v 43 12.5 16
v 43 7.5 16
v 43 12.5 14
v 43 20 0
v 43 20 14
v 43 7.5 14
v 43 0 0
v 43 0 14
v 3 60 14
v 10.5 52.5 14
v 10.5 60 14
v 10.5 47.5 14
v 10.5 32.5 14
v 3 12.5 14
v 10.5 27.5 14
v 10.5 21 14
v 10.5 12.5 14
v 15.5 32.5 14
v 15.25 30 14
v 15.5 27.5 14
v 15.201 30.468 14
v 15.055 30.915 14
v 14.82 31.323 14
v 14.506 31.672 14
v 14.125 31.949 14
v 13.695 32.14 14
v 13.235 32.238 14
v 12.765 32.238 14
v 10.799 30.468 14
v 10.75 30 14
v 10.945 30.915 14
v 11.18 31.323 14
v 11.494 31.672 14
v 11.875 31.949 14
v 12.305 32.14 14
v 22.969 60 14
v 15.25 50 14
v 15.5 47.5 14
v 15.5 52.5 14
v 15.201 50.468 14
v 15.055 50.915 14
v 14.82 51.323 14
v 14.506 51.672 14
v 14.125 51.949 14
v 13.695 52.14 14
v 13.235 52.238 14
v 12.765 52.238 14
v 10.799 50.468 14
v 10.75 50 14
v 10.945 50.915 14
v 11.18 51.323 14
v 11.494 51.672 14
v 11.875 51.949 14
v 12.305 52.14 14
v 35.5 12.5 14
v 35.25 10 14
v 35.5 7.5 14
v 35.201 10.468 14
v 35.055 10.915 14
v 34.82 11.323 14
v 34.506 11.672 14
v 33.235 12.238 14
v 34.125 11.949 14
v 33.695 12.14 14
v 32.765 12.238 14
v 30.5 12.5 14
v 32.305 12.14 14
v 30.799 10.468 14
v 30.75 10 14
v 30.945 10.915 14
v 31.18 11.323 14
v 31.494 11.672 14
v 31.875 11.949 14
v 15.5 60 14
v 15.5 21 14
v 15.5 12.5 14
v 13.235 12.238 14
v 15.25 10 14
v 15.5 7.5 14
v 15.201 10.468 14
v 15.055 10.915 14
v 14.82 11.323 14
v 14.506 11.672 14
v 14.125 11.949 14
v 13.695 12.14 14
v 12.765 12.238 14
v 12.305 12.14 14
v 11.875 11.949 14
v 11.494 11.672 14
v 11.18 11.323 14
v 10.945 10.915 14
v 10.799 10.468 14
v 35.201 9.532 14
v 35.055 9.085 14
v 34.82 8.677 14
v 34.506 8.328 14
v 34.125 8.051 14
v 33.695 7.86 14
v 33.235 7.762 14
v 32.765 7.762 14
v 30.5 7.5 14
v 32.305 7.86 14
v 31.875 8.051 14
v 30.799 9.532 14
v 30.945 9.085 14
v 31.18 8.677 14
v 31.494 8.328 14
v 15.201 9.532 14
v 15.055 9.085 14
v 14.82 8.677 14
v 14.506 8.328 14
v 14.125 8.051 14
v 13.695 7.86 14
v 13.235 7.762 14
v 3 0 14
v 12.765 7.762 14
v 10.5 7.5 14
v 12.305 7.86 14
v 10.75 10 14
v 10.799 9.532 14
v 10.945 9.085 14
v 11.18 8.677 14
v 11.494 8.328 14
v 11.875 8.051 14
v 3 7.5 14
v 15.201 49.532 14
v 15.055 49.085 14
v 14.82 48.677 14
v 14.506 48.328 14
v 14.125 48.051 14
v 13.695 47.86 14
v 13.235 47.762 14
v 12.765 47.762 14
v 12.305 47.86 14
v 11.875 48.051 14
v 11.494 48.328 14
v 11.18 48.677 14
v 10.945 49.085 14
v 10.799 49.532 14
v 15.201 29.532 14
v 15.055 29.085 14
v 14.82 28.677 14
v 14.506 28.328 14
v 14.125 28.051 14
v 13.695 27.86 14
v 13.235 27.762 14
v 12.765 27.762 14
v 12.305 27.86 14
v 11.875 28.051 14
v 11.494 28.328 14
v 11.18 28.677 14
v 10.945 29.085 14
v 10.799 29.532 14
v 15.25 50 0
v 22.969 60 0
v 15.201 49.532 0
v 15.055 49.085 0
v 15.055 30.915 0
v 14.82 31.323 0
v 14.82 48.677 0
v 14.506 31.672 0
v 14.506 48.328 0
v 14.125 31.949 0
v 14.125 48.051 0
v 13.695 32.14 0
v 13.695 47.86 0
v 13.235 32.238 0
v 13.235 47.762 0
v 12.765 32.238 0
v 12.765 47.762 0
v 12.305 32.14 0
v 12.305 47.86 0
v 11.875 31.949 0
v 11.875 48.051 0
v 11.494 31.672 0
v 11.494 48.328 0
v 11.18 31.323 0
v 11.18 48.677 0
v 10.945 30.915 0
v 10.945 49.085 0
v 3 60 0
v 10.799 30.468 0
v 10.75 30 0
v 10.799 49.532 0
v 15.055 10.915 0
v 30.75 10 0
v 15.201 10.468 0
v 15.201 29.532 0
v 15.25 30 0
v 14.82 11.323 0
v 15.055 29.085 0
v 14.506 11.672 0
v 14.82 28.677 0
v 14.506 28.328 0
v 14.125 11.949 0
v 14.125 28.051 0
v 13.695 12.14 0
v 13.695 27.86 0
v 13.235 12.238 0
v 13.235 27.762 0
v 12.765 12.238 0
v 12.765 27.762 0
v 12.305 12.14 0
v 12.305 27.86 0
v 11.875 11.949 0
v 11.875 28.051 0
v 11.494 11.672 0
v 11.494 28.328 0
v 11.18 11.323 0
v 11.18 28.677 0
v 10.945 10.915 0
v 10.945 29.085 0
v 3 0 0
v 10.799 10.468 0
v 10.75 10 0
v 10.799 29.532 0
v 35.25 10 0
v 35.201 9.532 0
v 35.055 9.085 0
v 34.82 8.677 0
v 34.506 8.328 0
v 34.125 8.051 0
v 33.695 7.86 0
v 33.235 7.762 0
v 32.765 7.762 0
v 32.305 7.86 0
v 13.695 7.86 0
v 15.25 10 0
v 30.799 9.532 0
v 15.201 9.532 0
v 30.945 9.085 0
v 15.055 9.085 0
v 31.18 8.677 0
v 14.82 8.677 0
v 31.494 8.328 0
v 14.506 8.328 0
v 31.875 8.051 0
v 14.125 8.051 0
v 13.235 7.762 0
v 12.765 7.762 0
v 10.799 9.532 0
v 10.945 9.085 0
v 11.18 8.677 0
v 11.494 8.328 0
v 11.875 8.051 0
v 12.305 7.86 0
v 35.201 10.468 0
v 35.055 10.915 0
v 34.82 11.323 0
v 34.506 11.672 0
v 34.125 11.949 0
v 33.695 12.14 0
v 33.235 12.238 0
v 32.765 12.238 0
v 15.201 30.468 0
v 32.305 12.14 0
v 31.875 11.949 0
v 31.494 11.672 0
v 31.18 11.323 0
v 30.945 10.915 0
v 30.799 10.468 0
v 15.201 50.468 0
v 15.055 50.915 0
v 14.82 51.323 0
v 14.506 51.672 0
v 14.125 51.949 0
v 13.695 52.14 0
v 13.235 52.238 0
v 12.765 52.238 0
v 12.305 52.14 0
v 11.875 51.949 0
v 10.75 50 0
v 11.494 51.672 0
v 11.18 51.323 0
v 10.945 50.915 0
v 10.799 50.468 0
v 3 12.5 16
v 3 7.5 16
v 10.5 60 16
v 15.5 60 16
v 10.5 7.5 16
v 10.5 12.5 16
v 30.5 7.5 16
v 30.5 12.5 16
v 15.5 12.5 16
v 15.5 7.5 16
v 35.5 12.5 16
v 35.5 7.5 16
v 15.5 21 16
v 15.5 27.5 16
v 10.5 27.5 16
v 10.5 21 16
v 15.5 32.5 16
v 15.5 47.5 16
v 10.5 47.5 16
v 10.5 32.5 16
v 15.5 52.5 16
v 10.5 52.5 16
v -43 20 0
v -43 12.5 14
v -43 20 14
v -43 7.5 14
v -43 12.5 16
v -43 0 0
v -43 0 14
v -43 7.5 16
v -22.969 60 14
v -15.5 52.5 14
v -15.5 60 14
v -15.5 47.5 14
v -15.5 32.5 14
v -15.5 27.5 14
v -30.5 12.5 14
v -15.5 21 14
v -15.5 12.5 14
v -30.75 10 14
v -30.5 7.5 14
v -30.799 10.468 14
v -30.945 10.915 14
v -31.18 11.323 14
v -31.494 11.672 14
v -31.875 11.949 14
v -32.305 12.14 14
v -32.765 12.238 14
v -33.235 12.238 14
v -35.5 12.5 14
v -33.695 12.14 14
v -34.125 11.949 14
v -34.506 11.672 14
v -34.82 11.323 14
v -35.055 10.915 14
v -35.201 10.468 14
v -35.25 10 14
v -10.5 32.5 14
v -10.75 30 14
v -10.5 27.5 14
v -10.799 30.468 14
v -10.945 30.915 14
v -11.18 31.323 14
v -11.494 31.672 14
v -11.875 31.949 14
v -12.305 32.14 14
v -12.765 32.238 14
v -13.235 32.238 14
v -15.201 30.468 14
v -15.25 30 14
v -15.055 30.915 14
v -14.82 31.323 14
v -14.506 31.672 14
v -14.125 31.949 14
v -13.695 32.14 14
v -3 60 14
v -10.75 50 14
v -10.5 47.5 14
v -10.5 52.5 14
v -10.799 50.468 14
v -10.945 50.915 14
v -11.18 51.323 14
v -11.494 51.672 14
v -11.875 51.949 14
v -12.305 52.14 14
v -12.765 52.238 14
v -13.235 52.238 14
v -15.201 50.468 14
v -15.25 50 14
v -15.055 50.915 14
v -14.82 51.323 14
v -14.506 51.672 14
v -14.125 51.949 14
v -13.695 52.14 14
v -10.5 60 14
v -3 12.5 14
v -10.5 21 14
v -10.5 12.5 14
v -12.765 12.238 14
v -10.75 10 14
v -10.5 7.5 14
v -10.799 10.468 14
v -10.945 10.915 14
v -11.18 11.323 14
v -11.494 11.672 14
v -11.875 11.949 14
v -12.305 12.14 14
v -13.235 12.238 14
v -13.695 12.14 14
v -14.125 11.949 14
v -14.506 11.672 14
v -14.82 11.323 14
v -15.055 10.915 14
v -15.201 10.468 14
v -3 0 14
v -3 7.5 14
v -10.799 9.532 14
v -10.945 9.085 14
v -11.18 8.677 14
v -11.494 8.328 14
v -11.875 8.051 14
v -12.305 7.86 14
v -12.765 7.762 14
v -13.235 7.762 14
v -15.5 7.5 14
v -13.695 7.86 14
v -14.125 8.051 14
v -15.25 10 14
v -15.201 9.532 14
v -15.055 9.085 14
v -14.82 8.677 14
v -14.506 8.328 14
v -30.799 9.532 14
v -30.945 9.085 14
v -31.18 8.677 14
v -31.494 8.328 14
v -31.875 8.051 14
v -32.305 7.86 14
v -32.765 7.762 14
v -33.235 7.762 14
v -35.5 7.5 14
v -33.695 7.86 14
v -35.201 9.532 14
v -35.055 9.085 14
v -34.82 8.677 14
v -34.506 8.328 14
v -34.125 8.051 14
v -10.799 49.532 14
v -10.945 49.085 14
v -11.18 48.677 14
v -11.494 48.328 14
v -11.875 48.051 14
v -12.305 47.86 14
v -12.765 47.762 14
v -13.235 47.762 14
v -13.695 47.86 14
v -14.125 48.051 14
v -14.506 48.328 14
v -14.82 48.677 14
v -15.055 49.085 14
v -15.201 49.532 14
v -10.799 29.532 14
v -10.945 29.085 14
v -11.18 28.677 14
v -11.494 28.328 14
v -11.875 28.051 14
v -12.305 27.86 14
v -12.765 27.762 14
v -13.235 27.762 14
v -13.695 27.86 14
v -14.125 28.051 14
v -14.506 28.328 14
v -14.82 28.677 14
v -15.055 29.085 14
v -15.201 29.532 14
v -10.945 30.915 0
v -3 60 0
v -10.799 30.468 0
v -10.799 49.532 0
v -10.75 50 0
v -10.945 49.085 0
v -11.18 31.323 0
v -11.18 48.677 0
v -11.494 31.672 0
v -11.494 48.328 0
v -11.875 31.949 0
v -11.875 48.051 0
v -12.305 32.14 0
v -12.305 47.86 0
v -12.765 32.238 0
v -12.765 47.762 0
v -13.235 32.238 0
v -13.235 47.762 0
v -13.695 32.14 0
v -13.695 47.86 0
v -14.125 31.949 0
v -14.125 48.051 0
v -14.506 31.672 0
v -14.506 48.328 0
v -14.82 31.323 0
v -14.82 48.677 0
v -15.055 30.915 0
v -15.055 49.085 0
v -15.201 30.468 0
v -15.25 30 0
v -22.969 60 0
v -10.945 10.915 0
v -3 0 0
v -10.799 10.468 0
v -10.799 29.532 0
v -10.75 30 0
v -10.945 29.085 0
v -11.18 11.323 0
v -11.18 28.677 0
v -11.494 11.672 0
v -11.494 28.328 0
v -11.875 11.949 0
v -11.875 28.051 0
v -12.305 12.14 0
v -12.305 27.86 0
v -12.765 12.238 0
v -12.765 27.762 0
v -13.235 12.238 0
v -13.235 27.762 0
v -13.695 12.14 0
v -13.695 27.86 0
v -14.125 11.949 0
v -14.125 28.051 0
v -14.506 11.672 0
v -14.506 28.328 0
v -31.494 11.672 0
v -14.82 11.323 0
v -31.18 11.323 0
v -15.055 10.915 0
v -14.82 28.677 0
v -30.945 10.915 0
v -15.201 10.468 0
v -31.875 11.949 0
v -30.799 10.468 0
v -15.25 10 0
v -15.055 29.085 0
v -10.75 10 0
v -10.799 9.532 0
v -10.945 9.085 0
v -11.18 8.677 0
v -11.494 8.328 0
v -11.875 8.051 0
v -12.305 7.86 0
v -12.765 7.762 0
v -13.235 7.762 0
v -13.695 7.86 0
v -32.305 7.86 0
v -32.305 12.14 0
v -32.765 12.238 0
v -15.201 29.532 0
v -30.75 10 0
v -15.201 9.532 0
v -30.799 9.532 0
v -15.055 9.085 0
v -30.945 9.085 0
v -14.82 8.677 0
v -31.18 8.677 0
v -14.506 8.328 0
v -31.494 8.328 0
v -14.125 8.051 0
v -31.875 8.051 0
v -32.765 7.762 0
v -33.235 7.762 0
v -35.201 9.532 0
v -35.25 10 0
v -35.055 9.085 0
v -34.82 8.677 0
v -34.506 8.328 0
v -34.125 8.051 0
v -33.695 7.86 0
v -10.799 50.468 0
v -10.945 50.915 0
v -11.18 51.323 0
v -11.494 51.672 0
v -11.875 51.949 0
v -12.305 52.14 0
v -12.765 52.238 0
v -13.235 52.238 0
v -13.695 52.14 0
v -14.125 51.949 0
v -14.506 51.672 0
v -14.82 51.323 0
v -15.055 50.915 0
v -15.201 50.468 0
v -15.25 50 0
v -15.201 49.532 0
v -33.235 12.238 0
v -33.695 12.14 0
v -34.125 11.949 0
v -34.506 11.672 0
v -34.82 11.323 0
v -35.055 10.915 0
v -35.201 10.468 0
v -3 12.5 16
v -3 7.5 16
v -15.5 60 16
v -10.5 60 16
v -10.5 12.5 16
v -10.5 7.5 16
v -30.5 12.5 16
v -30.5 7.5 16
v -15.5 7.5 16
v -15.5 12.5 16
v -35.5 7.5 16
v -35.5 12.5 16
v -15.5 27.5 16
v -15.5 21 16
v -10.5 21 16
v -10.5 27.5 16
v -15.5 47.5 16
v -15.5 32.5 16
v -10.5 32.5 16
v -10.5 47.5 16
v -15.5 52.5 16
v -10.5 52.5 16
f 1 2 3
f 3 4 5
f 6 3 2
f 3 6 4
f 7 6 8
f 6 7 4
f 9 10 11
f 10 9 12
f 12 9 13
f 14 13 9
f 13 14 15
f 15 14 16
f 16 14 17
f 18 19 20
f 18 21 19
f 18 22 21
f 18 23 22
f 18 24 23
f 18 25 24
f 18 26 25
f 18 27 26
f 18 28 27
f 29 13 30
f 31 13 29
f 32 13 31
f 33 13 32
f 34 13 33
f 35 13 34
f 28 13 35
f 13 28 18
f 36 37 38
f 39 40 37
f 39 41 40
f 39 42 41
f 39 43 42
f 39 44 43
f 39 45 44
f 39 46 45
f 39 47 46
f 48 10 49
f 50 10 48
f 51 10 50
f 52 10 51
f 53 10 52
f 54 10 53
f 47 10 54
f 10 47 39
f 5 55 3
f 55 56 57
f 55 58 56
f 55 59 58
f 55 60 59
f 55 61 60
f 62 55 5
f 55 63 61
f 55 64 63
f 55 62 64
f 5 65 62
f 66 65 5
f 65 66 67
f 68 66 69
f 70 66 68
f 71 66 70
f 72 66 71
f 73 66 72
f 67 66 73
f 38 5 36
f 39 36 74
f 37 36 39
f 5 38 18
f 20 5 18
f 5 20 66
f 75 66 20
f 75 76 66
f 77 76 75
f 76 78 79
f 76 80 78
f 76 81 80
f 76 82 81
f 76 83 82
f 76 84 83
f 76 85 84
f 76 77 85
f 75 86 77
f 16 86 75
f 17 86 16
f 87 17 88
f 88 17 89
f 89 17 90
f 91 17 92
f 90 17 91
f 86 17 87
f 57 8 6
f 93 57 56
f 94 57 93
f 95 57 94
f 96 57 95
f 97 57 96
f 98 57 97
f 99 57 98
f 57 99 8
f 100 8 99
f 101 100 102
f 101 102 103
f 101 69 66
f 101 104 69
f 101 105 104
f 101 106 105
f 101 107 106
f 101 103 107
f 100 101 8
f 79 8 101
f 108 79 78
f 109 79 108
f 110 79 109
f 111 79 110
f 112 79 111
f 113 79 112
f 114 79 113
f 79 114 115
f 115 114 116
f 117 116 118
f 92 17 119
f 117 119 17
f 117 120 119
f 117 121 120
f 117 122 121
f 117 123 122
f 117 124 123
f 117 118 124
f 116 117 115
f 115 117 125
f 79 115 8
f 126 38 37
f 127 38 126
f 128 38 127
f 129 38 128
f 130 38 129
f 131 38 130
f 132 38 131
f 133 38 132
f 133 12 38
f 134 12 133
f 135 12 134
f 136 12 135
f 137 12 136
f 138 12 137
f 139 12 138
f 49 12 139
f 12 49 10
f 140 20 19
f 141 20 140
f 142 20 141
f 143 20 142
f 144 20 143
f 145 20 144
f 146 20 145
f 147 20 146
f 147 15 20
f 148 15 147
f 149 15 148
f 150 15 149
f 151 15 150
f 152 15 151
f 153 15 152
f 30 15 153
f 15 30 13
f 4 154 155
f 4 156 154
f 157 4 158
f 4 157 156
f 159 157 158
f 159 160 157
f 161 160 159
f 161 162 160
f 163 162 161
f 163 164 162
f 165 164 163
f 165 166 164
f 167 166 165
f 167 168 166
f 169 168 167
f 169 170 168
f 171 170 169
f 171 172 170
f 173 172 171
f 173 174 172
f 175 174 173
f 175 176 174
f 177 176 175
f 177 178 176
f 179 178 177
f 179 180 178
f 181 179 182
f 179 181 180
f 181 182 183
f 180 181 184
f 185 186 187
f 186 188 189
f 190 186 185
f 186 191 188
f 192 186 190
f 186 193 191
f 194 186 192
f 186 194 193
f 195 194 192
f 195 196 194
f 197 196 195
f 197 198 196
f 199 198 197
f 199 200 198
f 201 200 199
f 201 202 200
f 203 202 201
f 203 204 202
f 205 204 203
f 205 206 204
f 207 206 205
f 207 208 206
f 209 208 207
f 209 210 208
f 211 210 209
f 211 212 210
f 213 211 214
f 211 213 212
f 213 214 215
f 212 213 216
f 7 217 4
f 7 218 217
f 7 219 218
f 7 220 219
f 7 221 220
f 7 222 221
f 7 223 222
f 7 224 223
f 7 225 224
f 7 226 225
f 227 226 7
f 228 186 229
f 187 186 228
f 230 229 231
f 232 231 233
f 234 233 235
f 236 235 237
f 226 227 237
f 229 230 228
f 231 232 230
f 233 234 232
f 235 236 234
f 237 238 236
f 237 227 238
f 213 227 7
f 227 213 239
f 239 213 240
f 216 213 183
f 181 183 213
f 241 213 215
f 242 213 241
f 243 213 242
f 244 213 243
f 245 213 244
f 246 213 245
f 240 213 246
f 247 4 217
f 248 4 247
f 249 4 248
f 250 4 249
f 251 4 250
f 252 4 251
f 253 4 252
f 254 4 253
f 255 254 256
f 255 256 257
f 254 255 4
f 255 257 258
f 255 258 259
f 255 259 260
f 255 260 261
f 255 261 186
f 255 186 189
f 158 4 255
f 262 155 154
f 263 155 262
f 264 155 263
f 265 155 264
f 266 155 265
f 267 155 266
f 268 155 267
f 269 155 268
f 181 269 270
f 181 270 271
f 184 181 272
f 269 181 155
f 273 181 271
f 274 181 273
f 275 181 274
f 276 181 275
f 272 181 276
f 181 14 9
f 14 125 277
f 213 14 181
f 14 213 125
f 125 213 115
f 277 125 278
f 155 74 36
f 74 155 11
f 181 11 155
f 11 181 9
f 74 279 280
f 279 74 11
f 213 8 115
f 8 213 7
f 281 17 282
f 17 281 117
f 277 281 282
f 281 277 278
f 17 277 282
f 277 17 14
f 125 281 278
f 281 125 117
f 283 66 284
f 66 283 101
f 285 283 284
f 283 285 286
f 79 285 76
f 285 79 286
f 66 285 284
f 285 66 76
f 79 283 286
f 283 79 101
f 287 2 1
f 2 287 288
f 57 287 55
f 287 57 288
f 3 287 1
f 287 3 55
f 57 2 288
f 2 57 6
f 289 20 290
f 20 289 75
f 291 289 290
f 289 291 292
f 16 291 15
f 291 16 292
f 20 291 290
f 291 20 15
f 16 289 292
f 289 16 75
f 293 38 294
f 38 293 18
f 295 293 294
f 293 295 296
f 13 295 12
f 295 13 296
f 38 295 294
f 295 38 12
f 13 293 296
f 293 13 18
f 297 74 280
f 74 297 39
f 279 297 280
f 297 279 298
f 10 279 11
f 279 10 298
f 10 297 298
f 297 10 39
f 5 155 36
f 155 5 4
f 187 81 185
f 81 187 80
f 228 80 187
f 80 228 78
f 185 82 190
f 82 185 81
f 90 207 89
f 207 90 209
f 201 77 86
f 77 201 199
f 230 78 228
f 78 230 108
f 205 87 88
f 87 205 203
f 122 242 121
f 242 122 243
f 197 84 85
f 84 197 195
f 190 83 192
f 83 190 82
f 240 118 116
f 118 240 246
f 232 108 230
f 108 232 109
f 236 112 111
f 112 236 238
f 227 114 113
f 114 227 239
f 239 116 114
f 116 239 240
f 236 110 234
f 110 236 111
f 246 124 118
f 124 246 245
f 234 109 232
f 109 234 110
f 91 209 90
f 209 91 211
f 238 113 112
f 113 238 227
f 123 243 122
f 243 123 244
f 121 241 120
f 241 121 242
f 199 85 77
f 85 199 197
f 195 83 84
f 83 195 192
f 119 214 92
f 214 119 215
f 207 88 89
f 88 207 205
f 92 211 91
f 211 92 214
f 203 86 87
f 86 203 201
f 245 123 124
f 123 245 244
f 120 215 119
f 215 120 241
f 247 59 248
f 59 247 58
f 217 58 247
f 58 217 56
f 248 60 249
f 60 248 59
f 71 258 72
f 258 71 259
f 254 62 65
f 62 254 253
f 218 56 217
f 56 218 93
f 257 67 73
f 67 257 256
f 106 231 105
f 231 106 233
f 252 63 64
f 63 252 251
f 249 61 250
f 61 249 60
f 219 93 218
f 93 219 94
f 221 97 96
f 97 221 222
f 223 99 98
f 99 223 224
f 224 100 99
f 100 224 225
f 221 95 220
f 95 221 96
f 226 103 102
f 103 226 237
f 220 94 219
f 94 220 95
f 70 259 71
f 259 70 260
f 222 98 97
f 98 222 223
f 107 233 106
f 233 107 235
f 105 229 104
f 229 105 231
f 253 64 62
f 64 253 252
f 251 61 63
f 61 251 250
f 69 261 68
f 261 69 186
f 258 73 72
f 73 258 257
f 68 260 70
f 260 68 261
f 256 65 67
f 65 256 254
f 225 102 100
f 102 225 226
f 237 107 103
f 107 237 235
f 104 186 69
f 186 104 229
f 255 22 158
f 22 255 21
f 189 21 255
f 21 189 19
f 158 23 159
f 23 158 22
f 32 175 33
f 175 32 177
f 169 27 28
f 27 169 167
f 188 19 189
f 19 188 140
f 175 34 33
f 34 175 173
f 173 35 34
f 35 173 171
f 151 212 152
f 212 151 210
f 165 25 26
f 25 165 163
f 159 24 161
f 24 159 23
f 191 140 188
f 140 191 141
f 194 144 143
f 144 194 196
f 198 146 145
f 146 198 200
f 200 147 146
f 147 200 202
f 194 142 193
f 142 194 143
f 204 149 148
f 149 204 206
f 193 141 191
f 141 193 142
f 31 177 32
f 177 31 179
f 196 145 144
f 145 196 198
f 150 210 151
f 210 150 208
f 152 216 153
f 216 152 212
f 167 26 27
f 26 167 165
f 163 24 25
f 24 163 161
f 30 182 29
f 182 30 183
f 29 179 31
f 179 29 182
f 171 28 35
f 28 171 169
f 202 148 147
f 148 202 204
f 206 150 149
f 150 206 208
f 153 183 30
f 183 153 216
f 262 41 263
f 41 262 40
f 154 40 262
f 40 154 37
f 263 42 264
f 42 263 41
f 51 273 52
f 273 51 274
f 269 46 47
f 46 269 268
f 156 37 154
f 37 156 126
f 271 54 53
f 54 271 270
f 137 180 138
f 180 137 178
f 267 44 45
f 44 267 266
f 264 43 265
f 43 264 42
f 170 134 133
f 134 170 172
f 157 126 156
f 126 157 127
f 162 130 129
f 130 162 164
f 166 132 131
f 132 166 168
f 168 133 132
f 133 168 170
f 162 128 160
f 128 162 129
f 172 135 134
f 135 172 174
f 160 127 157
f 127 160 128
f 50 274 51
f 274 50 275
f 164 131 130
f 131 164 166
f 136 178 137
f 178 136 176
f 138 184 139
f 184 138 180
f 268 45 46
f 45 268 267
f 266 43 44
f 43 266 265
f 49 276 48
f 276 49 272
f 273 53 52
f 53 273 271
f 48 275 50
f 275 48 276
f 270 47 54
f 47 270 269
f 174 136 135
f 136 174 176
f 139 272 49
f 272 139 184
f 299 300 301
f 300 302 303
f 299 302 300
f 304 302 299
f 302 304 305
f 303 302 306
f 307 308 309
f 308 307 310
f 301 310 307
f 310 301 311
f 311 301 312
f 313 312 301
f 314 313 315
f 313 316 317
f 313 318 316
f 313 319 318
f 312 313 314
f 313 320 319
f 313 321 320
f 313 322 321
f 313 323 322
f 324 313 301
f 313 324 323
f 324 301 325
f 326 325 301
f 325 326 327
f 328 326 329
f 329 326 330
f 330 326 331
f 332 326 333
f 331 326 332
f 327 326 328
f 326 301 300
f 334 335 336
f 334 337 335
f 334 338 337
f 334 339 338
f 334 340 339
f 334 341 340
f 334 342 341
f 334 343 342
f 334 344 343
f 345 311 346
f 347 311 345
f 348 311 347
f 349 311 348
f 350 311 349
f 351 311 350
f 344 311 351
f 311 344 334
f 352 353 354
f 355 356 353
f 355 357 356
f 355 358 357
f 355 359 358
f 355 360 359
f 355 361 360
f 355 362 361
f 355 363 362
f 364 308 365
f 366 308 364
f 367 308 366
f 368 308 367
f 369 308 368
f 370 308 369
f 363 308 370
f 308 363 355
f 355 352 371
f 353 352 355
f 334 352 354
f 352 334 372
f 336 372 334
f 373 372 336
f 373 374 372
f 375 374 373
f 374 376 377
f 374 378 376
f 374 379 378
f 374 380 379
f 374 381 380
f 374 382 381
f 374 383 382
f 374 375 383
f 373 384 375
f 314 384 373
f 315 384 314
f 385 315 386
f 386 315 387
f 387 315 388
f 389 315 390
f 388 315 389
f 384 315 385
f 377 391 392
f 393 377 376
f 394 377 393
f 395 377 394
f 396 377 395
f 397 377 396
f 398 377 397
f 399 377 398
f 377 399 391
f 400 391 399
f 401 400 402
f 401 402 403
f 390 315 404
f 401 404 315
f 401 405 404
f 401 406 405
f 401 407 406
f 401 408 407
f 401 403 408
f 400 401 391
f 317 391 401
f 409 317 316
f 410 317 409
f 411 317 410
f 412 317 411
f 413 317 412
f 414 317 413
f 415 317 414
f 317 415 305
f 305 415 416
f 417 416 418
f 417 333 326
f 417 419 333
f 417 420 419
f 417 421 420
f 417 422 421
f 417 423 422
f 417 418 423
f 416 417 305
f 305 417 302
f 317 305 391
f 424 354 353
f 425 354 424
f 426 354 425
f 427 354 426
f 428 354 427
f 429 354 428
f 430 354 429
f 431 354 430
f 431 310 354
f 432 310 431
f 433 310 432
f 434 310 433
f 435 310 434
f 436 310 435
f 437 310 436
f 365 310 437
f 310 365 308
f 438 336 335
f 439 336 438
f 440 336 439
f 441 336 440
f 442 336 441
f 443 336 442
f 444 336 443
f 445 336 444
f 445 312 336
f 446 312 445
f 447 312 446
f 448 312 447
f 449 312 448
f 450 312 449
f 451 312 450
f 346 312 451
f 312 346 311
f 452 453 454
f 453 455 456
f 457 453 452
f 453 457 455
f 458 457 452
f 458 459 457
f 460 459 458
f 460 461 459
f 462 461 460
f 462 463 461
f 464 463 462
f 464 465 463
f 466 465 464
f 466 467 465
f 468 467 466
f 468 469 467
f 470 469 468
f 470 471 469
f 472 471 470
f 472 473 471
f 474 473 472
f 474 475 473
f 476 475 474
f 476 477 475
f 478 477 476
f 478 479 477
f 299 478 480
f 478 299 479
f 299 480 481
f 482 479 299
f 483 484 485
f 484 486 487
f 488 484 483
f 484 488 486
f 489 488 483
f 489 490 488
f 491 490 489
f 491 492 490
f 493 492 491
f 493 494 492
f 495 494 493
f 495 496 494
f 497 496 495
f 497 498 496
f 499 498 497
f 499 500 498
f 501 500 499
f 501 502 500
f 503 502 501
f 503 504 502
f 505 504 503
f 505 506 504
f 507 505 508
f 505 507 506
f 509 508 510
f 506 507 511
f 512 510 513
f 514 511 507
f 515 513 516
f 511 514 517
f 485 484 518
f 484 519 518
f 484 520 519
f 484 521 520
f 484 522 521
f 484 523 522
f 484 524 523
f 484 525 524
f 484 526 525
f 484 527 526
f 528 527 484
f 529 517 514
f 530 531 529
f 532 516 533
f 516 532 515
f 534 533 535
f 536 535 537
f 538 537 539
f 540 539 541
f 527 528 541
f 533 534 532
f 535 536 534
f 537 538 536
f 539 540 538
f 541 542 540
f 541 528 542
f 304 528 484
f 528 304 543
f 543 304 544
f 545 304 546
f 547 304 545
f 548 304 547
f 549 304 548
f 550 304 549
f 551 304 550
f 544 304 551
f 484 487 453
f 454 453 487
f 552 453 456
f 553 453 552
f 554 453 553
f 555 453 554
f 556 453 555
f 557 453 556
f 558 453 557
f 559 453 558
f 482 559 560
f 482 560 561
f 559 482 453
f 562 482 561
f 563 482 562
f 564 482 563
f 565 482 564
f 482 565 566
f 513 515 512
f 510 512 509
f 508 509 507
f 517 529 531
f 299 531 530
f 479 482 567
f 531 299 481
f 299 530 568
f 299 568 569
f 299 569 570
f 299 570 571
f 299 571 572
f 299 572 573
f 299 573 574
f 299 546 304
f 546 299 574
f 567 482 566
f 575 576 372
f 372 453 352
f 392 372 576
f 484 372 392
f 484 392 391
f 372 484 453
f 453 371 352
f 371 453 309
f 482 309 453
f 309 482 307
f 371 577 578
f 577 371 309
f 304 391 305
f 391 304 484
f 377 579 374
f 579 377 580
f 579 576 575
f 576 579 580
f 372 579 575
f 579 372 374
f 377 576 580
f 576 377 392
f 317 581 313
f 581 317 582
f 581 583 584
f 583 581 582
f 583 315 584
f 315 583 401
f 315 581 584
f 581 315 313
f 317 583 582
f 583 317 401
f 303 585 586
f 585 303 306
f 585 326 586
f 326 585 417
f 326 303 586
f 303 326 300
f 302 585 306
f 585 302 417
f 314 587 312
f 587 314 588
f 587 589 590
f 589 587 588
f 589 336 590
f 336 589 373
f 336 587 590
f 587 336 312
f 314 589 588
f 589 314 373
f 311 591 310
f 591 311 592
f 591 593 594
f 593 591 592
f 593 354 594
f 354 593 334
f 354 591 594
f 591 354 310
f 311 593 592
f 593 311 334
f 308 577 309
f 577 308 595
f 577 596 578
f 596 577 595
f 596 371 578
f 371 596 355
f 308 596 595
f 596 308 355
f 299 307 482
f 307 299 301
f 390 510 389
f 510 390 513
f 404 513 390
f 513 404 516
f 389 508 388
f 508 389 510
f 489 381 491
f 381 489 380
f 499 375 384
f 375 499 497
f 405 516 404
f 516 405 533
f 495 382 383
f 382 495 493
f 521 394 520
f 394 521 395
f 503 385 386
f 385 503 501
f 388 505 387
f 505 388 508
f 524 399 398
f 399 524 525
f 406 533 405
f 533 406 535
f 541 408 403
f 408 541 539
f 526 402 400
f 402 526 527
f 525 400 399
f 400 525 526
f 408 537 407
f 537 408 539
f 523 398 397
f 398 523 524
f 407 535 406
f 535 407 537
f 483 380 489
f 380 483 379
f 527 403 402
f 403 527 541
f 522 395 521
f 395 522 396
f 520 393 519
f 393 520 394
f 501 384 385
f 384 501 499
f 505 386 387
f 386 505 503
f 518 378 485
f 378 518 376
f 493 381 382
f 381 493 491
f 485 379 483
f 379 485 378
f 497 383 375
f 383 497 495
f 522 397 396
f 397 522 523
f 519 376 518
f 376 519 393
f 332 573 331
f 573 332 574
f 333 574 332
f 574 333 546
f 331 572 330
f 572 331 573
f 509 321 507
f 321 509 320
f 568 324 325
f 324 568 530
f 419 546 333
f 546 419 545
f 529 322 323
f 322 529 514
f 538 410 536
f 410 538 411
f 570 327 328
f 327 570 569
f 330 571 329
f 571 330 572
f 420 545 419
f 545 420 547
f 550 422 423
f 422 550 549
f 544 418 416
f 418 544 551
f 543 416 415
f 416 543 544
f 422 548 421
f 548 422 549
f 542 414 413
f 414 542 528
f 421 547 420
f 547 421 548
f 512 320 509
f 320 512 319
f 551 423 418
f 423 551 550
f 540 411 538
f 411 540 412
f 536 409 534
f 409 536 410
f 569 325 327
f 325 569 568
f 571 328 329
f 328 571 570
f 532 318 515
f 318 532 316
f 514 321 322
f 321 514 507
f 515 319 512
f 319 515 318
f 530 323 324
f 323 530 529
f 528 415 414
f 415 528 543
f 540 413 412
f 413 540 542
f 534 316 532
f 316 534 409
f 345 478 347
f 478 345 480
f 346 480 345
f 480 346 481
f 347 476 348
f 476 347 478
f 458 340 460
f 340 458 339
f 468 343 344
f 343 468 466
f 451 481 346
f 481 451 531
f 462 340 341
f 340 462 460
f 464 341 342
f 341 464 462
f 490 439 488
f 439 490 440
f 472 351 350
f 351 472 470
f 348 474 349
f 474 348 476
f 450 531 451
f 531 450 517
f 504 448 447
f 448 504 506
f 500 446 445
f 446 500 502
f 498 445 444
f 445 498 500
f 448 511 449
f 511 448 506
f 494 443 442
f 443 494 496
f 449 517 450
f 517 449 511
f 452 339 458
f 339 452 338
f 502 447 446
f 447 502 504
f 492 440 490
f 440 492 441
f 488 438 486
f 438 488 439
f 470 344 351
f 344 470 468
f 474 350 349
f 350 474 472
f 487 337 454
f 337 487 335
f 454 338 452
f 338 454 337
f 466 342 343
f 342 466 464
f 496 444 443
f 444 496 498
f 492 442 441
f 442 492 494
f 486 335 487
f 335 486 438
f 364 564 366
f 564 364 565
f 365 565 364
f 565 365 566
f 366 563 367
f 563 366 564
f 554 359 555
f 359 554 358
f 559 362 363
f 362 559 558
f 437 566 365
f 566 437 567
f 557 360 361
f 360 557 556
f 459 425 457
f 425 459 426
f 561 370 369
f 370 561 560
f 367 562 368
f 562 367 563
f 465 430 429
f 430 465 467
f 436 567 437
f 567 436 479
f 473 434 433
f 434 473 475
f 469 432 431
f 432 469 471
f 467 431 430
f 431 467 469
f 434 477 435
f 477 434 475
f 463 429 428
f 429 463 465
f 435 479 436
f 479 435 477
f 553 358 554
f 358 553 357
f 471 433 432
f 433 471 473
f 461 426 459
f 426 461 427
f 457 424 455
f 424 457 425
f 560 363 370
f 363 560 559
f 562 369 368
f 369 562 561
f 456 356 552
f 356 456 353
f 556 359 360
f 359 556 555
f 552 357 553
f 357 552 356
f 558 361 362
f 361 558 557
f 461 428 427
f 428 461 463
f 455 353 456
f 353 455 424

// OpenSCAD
// file: metric.scad
// PRUSA Mendel  
// Default metric sizes
// GNU GPL v3
// Josef Průša
// josefprusa@me.com
// prusadjs.cz
// http://www.reprap.org/wiki/Prusa_Mendel
// http://github.com/prusajr/PrusaMendel

// DONT CHANGE THIS FILE! ALTER VALUES IN CONFIGURATION.SCAD INSTEAD

// RODS

threaded_rod_diameter = 8.7;
threaded_rod_diameter_horizontal = 8.7;
smooth_bar_diameter = 8;
smooth_bar_diameter_horizontal = 8.5;

// Nuts and bolts

m8_diameter = 9;
m8_nut_diameter = 14.1;

m4_diameter = 4.5;
m4_nut_diameter = 8.5;

m3_diameter = 3.6;
m3_nut_diameter = 5.3;
m3_nut_diameter_horizontal = 6.1;

// Bushing holder

bushing_core_diameter = smooth_bar_diameter;
bushing_material_thickness = 1;

// Motors

motor_shaft = 5.5;
// main file
// C. Strang		
// cstrang@????
// funfor.us

h = 14;      //height 14 for normal "thick" parts
//h = 6;		// height 6 for "thin" parts

t = 2;		// tab thickness
o = 0.1;	//  overlap amount

include <metric.scad>;

$fn=30;

#translate([3,0,0]) 90part();
#translate([-3,0,0]) mirror() 90part();

module 90part()
{
	difference()
	{
		union()
		{
			translate([0,0,0]) rotate([0,0,0]) cube([40,60,h]);
			translate([0,7.5,h-o]) rotate([0,0,0]) cube([7.5,5,t+o]);
			translate([12.5,7.5,h-o]) rotate([0,0,0]) cube([15,5,t+o]);
			translate([32.5,7.5,h-o]) rotate([0,0,0]) cube([7.5,5,t+o]);
			translate([7.5,21,h-o]) rotate([0,0,0]) cube([5,6.5,t+o]);
			translate([7.5,32.5,h-o]) rotate([0,0,0]) cube([5,15,t+o]);
			translate([7.5,52.5,h-o]) rotate([0,0,0]) cube([5,7.5,t+o]);

		}
		translate([40,20,-o]) rotate([0,0,26.6]) cube([30,50,h+4]);
		translate([10,10,-o]) cylinder(r=m4_diameter/2,h=h+4);
		translate([30,10,-o]) cylinder(r=m4_diameter/2,h=h+4);
		translate([10,30,-o]) cylinder(r=m4_diameter/2,h=h+4);
		translate([10,50,-o]) cylinder(r=m4_diameter/2,h=h+4);
	}

}
